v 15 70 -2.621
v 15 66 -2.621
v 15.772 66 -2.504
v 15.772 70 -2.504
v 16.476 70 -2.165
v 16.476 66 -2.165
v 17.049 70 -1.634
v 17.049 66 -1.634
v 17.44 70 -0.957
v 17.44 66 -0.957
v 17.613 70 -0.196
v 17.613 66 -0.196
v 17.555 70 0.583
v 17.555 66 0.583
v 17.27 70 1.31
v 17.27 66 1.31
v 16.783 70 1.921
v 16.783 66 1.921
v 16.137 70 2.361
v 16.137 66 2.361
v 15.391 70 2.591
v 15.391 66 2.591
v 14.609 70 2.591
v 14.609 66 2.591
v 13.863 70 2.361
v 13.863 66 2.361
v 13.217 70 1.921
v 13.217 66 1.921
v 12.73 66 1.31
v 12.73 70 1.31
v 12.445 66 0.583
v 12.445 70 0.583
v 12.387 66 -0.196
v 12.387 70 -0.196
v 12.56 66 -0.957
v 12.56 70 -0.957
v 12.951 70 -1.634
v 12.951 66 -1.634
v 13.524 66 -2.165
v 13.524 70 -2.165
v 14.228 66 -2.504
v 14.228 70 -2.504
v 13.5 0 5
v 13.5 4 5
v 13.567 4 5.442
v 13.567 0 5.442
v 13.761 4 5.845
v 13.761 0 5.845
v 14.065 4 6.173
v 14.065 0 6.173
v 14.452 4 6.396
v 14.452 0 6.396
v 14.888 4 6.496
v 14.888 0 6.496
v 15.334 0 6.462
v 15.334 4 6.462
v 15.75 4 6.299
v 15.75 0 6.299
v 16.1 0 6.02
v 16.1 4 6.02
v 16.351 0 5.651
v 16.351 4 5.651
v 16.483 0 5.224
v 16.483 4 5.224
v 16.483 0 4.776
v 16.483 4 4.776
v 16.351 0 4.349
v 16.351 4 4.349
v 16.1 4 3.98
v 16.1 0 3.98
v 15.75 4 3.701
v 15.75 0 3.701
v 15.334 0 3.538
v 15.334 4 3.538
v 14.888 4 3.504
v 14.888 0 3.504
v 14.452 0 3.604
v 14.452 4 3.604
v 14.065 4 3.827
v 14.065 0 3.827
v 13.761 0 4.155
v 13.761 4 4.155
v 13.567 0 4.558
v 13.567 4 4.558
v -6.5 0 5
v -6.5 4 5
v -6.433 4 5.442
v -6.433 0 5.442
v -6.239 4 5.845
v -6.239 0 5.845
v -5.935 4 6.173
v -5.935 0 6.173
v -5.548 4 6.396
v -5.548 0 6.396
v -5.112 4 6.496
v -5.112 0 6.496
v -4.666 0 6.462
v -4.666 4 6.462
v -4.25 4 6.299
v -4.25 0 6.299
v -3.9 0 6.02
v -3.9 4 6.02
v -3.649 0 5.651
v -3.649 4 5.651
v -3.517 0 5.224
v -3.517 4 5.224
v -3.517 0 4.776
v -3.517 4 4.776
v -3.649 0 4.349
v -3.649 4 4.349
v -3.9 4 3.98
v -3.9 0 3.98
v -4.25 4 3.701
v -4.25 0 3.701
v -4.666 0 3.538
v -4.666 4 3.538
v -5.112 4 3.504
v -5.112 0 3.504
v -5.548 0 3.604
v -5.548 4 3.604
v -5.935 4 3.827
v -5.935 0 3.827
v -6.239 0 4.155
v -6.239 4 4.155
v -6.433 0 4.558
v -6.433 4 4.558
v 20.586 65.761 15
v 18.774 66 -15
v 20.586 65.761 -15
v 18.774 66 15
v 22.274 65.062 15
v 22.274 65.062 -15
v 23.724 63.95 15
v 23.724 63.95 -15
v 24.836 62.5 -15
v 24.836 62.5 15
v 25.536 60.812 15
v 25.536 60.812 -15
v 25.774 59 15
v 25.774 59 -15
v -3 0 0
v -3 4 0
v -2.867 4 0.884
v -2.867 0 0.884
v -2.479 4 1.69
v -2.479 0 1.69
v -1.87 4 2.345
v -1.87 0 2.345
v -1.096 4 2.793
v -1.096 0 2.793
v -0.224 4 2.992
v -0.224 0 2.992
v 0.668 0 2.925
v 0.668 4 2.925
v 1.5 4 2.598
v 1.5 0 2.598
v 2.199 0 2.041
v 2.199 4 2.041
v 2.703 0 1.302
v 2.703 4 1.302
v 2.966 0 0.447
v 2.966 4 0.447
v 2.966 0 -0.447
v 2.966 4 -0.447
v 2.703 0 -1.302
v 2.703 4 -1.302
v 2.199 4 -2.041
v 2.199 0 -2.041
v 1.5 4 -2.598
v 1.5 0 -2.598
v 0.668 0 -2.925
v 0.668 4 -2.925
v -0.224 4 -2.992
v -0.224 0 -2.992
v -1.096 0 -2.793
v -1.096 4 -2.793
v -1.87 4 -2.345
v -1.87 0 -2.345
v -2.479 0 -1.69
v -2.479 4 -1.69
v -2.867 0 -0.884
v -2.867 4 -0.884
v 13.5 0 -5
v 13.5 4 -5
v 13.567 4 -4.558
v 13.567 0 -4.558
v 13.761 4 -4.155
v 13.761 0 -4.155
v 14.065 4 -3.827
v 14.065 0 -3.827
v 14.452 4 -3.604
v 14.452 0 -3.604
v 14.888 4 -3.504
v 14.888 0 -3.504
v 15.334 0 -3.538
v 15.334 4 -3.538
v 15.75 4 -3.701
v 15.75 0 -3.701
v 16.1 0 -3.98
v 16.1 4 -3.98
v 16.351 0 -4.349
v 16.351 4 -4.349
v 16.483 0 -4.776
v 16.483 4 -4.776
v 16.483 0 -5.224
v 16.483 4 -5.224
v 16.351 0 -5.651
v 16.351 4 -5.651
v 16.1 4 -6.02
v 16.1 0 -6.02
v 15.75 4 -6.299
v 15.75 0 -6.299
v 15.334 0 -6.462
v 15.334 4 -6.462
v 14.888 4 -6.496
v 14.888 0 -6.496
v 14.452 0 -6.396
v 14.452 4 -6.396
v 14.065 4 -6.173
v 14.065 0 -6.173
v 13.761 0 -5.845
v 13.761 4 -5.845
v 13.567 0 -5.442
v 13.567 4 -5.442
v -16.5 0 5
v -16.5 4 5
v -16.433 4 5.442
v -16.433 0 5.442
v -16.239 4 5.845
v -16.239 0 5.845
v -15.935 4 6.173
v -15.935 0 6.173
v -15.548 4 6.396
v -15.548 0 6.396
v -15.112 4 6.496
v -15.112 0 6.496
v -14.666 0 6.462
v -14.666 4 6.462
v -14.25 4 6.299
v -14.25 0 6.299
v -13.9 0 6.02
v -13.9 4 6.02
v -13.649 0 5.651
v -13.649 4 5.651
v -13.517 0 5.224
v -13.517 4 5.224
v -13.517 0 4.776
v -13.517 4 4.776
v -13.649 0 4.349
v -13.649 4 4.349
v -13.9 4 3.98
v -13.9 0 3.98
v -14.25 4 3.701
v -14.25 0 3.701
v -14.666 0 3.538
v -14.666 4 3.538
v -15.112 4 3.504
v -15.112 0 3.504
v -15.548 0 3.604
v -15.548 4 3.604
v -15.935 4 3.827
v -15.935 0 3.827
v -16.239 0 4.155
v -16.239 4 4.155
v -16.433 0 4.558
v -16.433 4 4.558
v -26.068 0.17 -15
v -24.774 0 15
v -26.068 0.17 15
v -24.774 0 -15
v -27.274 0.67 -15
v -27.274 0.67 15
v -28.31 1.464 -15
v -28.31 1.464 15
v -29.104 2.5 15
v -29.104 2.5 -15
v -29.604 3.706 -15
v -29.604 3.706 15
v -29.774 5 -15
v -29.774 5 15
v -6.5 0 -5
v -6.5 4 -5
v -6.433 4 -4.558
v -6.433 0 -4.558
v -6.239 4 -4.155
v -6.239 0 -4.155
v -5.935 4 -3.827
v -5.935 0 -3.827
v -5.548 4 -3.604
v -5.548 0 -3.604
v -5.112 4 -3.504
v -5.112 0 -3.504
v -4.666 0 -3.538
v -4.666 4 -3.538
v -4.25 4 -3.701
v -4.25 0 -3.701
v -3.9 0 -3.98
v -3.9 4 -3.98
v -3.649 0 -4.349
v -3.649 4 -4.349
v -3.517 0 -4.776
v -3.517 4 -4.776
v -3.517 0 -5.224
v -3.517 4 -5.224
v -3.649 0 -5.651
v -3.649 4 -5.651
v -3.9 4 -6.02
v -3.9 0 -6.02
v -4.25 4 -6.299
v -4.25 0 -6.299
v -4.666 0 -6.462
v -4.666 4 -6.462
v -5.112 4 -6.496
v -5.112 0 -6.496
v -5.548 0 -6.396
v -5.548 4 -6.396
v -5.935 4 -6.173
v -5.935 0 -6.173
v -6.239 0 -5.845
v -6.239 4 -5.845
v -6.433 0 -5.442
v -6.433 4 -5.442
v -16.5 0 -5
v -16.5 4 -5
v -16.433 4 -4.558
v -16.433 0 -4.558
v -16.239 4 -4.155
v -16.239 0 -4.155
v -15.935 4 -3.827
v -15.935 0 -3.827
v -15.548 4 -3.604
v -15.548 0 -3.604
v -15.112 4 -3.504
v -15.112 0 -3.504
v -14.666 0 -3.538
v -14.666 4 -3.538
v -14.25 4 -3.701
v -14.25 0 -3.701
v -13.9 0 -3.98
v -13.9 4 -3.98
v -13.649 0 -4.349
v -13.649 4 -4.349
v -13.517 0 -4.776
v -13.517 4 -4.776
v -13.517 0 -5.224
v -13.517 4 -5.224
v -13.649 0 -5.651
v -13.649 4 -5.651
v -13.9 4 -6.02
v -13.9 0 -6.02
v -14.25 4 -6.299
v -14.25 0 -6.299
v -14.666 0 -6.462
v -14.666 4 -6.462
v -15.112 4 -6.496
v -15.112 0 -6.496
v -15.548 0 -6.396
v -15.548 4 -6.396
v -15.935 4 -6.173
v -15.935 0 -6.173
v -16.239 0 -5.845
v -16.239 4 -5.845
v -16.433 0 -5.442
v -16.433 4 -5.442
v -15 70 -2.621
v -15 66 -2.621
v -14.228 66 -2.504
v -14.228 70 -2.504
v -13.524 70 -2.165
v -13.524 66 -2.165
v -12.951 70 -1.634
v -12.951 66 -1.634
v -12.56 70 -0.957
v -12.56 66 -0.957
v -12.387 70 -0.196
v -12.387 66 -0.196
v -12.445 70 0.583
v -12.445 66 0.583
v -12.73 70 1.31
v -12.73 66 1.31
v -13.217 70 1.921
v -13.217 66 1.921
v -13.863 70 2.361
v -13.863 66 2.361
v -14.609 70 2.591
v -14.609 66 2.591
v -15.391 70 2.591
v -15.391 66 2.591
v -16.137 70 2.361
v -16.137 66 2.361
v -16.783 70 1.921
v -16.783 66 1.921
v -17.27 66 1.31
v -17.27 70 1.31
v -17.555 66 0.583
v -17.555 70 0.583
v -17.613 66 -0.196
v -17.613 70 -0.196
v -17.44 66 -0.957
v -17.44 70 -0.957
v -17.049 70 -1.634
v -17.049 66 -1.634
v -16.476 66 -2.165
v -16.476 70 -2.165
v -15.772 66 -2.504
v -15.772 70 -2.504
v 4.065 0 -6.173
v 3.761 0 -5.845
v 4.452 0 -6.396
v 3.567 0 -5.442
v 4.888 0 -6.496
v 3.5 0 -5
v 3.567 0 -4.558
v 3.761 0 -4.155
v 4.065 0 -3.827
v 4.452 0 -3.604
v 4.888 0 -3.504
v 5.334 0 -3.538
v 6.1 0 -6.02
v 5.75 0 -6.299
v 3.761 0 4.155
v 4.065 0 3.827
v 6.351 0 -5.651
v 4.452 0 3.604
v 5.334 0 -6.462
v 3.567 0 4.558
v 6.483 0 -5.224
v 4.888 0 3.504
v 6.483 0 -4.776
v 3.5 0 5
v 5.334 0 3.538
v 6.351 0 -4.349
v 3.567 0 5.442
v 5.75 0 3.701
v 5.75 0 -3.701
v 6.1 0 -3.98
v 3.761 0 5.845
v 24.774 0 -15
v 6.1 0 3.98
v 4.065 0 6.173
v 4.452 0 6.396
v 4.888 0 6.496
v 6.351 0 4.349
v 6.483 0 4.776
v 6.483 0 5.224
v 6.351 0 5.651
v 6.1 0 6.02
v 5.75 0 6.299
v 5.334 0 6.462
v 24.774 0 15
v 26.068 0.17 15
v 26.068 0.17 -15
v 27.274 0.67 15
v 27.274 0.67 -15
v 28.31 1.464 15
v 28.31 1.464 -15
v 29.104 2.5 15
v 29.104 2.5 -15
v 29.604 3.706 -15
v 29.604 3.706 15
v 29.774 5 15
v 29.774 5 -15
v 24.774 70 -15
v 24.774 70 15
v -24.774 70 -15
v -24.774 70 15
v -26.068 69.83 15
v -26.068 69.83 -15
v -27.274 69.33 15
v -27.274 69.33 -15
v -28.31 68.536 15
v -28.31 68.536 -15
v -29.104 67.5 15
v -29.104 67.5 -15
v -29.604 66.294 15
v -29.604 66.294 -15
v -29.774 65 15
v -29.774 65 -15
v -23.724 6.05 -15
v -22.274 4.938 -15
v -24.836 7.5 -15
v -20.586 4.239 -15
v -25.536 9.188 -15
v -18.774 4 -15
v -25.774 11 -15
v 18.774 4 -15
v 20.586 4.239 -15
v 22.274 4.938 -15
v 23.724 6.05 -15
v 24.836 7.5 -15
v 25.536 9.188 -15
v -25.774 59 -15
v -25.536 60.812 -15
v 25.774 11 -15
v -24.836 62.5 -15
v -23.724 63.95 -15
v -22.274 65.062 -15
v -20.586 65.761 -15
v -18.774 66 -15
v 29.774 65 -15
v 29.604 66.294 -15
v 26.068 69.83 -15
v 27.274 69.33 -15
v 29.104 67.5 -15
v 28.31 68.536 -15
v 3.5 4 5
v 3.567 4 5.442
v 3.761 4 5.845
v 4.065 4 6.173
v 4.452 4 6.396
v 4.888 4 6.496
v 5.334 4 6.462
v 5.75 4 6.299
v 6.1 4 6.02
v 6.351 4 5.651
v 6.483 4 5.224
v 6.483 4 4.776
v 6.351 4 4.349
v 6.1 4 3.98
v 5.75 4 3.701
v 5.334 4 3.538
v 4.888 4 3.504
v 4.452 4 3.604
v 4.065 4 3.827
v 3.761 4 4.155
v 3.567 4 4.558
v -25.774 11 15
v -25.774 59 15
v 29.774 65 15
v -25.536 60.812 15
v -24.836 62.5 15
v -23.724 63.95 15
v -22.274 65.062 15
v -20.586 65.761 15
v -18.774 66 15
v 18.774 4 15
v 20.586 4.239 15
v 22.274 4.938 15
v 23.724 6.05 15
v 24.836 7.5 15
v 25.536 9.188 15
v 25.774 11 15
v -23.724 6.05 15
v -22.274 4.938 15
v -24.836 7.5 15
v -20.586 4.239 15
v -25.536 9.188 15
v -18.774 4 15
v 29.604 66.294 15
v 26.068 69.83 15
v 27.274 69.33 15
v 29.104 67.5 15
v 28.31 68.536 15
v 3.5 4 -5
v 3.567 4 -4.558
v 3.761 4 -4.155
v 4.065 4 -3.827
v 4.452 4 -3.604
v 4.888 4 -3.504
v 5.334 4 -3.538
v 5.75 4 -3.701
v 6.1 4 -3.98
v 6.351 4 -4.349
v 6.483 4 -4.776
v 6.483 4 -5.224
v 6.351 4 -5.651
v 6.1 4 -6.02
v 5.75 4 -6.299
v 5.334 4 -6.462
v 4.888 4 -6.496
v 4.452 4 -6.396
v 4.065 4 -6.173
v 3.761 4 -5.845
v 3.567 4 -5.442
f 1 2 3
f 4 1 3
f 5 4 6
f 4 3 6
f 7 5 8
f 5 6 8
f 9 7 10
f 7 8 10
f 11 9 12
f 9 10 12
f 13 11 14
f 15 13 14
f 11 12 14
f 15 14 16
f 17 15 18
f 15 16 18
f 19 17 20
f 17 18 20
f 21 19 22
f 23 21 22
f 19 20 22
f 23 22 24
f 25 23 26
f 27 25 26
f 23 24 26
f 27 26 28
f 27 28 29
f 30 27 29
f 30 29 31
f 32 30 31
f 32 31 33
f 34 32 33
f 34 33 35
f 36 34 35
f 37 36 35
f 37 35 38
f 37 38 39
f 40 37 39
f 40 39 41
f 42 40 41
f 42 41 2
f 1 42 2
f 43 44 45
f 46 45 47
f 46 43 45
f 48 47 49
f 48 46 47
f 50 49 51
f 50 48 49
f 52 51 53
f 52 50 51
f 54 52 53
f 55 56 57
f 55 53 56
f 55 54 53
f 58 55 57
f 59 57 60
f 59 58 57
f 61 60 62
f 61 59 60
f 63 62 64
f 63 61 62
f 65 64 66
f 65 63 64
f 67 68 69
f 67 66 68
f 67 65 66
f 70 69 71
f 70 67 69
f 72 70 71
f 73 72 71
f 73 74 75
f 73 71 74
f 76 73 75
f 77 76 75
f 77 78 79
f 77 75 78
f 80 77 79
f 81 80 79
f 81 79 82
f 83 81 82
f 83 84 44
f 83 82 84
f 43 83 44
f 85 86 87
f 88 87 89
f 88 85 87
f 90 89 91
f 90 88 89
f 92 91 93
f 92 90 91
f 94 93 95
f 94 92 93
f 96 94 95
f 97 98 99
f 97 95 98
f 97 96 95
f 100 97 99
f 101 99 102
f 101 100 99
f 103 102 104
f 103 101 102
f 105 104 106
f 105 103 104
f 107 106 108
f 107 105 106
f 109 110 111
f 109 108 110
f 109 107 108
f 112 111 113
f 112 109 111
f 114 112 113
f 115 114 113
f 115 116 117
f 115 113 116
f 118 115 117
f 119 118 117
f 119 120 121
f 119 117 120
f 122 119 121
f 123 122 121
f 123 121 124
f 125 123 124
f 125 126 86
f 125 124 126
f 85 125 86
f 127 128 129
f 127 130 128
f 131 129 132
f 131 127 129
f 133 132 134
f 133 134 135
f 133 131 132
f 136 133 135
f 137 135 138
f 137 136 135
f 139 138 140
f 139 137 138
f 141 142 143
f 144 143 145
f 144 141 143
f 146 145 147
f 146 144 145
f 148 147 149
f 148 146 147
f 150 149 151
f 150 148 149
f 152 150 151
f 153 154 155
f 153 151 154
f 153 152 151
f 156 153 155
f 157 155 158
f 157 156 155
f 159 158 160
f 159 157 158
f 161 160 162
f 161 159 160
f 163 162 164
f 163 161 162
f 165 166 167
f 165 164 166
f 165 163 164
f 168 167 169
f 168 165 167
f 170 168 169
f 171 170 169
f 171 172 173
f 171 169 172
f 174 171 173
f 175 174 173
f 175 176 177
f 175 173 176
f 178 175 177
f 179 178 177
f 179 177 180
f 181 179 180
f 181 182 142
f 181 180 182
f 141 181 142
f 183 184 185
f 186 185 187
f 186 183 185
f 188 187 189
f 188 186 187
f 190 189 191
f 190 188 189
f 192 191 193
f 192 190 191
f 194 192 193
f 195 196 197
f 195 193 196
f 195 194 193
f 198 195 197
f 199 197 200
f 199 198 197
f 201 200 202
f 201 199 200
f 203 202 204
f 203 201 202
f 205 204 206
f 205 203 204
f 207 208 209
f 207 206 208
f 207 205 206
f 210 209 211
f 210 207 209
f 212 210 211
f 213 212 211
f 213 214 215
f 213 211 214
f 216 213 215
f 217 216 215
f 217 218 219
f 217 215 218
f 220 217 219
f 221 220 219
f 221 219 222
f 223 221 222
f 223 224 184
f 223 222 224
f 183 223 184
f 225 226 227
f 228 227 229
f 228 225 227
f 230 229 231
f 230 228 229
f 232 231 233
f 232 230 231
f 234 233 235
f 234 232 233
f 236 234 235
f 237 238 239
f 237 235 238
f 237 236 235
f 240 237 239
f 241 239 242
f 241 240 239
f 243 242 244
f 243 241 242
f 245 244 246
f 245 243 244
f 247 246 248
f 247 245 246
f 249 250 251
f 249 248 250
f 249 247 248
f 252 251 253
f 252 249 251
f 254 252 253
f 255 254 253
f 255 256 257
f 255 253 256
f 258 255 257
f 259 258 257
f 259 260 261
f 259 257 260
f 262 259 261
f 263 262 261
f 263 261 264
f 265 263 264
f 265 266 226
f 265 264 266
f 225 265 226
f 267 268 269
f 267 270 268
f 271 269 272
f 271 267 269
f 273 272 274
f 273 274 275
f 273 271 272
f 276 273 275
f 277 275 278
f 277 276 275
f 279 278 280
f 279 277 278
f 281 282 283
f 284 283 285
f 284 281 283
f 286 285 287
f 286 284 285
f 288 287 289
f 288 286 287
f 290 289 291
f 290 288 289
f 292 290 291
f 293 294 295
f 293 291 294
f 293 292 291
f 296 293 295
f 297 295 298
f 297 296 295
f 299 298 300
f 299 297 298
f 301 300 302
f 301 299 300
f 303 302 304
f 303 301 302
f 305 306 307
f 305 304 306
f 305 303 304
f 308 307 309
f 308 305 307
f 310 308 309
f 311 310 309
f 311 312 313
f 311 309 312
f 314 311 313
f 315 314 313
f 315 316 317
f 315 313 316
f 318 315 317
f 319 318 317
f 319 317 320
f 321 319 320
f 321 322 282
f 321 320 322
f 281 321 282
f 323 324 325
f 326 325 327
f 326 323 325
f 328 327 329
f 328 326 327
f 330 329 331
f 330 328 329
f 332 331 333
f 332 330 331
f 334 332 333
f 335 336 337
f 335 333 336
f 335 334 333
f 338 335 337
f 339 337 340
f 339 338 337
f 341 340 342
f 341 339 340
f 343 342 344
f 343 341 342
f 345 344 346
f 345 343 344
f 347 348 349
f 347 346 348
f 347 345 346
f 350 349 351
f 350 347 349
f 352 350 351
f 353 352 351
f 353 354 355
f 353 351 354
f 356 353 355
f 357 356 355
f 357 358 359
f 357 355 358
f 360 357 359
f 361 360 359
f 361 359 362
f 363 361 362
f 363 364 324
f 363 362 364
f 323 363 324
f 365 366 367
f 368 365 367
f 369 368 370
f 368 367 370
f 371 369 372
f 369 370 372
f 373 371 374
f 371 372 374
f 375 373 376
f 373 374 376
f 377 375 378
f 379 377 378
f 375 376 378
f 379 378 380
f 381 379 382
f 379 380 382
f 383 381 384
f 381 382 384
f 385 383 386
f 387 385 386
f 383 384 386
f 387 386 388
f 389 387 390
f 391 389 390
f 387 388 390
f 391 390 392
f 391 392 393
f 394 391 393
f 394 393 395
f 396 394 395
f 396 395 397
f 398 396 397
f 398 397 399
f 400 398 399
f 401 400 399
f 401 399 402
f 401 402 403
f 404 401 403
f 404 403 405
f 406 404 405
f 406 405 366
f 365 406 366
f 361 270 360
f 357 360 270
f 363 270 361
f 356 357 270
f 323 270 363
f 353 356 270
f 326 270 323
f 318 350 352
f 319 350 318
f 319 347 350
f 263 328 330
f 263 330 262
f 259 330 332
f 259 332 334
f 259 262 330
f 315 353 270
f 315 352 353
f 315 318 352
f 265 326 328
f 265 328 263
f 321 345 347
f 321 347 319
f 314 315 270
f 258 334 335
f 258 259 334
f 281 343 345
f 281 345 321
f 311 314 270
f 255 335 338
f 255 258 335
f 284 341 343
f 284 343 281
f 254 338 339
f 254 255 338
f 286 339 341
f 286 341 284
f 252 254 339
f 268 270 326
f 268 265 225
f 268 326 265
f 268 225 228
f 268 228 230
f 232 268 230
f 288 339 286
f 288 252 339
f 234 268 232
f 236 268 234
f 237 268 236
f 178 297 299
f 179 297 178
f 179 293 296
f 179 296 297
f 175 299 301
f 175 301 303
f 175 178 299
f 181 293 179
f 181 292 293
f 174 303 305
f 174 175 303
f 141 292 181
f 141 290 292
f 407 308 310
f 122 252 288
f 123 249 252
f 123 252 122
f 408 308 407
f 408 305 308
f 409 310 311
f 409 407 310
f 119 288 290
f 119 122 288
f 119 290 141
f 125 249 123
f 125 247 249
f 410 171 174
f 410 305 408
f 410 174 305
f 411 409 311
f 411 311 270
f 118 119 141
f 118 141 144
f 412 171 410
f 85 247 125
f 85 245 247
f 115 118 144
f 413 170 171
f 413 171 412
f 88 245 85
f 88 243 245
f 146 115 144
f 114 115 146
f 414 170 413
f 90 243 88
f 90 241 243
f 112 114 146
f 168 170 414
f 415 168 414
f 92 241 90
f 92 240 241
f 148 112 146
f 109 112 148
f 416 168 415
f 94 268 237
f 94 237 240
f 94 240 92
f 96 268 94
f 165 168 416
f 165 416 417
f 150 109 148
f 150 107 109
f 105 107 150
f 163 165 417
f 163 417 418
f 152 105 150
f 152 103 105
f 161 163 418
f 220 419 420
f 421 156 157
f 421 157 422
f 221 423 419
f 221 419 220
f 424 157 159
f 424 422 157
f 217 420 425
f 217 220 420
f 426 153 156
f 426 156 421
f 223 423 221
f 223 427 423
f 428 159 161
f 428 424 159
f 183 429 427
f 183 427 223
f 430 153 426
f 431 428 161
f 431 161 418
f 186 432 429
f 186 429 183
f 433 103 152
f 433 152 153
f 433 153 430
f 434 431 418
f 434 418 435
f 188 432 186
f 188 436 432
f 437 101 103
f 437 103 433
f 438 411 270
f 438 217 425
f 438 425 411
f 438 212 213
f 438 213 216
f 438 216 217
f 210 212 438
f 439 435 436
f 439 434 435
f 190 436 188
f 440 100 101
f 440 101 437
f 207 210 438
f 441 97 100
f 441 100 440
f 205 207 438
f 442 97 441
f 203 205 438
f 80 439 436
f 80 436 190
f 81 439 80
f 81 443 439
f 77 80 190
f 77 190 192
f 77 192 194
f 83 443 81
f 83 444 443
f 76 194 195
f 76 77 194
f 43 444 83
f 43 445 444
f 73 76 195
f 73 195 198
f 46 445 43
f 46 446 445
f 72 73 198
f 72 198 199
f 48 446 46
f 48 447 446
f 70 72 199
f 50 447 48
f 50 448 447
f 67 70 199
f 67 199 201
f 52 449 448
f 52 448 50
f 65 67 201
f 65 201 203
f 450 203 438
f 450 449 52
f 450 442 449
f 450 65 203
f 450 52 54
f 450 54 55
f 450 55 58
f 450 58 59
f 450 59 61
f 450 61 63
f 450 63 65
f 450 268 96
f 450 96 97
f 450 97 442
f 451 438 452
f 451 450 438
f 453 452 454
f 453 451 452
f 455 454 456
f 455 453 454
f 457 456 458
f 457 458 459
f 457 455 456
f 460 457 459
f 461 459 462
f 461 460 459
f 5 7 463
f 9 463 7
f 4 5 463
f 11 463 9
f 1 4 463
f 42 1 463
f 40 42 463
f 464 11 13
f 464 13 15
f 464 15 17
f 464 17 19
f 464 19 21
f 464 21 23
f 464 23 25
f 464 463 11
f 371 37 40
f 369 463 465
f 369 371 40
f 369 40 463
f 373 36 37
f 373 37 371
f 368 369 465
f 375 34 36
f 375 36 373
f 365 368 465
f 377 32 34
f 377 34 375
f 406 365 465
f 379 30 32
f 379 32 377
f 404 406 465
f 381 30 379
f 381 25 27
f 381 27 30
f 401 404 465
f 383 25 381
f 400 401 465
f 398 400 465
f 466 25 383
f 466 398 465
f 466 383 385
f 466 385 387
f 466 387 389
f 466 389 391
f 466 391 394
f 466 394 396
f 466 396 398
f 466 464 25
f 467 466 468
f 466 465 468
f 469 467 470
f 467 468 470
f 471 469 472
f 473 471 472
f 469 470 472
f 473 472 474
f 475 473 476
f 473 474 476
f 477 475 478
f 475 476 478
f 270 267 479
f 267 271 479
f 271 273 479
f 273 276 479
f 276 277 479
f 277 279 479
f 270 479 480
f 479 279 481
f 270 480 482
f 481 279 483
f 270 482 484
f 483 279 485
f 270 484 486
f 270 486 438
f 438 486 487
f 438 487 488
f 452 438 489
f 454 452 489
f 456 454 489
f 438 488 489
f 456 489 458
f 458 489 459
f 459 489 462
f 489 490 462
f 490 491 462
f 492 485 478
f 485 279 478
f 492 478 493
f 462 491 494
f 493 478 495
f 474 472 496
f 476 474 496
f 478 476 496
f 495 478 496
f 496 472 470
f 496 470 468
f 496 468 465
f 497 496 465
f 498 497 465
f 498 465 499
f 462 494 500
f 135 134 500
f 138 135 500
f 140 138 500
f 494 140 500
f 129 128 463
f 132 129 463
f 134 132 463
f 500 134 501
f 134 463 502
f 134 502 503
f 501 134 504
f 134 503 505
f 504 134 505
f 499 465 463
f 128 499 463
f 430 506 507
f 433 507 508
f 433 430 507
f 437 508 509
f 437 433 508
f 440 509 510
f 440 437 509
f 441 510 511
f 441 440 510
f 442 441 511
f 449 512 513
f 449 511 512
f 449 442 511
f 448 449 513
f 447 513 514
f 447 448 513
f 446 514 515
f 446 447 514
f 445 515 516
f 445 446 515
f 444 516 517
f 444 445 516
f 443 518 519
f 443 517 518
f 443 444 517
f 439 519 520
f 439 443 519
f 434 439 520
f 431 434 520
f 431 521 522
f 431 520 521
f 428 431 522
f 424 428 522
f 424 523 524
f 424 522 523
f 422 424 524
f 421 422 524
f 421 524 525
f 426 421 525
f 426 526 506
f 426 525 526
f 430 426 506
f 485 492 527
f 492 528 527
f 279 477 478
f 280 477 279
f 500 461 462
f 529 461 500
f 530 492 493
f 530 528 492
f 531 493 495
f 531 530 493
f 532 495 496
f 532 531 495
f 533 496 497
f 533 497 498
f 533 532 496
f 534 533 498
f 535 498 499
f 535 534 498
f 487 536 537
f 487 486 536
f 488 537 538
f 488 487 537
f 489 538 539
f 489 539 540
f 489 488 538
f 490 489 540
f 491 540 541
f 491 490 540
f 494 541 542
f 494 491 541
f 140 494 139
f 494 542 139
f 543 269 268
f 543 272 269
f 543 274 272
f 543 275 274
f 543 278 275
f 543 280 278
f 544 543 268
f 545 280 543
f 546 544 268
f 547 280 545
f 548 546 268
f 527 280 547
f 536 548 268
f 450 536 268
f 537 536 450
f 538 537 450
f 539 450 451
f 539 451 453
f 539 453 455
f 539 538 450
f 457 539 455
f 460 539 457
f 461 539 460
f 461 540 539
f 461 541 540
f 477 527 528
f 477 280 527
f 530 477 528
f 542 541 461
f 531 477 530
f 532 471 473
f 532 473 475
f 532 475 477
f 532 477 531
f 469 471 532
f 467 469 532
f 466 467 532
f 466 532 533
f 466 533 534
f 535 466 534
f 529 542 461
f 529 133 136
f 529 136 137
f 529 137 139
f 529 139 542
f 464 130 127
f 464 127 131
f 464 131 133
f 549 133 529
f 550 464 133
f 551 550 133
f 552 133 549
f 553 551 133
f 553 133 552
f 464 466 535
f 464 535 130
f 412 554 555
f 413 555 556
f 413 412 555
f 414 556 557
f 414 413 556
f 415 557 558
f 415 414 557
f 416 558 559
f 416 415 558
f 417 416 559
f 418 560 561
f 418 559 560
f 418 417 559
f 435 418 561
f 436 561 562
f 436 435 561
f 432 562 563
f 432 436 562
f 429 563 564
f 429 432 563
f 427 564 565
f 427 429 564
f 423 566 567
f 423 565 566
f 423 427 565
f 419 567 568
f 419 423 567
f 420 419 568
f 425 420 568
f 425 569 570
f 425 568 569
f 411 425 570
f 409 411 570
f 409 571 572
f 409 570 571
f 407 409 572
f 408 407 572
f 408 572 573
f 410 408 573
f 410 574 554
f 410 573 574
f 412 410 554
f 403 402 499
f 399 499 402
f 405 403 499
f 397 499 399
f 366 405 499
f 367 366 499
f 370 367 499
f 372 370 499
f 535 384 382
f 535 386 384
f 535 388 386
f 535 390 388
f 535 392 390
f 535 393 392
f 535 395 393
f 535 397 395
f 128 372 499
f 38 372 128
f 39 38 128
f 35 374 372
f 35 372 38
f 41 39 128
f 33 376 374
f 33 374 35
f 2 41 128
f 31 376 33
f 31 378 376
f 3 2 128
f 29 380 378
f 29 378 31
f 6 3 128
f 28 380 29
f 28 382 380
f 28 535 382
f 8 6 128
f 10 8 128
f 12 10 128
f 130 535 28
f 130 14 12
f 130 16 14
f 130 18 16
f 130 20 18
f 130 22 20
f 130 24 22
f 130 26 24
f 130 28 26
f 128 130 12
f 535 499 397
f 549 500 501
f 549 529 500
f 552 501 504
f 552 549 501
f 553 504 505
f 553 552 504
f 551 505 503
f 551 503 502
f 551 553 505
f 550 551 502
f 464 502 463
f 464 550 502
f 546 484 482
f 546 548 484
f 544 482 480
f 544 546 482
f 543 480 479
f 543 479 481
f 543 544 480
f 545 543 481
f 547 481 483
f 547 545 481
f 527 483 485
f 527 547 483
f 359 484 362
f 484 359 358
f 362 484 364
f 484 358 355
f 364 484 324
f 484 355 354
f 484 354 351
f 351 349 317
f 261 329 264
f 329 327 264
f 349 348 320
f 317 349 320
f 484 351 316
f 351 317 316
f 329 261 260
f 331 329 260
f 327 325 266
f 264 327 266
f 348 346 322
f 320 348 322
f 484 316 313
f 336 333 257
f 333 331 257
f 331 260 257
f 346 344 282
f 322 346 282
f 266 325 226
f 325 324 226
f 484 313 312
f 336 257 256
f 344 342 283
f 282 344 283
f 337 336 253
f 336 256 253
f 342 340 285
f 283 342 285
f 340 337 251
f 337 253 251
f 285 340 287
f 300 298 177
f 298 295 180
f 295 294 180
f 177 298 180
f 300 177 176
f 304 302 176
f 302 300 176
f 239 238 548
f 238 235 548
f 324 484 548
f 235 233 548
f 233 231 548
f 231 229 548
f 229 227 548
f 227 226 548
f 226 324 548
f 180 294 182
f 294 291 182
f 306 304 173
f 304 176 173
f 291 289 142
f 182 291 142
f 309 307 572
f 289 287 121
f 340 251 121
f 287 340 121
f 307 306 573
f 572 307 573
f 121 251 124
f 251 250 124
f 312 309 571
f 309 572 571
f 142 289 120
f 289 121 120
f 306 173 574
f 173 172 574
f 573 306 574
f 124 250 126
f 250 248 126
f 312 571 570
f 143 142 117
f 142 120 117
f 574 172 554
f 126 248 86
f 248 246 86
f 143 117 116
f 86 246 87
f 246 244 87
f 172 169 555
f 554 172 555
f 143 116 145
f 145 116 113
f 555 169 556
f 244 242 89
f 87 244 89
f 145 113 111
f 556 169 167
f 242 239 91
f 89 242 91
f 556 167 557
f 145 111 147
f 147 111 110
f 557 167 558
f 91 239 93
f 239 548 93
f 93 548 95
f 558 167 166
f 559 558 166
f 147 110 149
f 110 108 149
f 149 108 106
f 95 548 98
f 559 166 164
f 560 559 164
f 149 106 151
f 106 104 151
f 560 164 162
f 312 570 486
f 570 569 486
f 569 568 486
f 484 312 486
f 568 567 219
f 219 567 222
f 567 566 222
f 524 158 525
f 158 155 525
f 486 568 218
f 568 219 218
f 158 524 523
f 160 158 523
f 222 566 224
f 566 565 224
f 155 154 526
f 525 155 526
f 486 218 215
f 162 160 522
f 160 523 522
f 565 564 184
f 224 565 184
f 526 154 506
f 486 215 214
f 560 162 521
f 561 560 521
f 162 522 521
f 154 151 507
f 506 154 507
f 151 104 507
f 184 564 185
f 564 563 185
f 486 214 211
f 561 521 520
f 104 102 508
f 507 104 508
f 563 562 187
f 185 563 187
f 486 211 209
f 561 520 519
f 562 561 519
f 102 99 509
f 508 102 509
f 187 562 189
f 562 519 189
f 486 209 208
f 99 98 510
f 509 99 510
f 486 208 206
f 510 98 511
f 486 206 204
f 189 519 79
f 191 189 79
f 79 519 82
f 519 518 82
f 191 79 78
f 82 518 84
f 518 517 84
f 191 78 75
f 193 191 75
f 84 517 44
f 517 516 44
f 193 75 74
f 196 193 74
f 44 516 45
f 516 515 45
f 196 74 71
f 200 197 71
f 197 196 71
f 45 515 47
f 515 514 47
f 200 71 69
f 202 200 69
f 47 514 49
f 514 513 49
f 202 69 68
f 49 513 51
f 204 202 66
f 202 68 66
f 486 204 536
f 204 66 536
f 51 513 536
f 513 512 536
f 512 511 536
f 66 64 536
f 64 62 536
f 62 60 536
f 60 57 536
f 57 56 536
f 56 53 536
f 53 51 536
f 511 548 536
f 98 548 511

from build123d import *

# Parameters (mm, degrees)
EXTRUDE_2_DEPTH     = 15
SKETCH_2_R          = 2.62067407
CUT_EXTRUDE_1_DEPTH = 74.942500428
FILLET_1_R          = 7
CUT_EXTRUDE_2_REACH = 79.534
SKETCH_3_R          = 3
SKETCH_3_R_2        = 1.5
FILLET_2_R          = 5


with BuildPart() as part:
    # 草图1 → 拉伸-薄壁2 (new, symmetric)
    with BuildSketch(Plane.XY):
        Polygon((-29.774038515, 0), (29.774038515, 0), (29.774038515, 70), (0, 70), (-29.774038515, 70), align=None)
        Polygon((-25.774038515, 4), (25.774038515, 4), (25.774038515, 66), (0, 66), (-25.774038515, 66), align=None, mode=Mode.SUBTRACT)
    extrude(amount=EXTRUDE_2_DEPTH, both=True)

    # 草图2 → 切除-拉伸1 (cut, through all)
    with BuildSketch(Plane(origin=(0, 66, 0), x_dir=(-1, 0, 0), z_dir=(0, -1, 0))):
        with Locations(Location((-15, 0, 0), (0, 0, 90))):
            Circle(SKETCH_2_R)
        with Locations(Location((15, 0, 0), (0, 0, 90))):
            Circle(SKETCH_2_R)
    extrude(amount=-CUT_EXTRUDE_1_DEPTH, mode=Mode.SUBTRACT)

    # 圆角1
    fillet_1_edges = [part.edges().sort_by_distance(p)[0] for p in [
        (-25.774038515, 4, 0),
        (25.774038515, 4, 0),
        (25.774038515, 66, 0),
        (-25.774038515, 66, 0),
    ]]
    fillet(fillet_1_edges, radius=FILLET_1_R)

    # 草图3 → 切除-拉伸2 (cut, up to next)
    with BuildSketch(Plane(origin=(0, 0, 0), x_dir=(1, 0, 0), z_dir=(0, 1, 0)), mode=Mode.PRIVATE) as cut_extrude_2_sk1:
        with Locations(Location((0, 0, 0), (0, 0, 180))):
            Circle(SKETCH_3_R)
    cut_extrude_2_tool1 = extrude(cut_extrude_2_sk1.sketch, amount=CUT_EXTRUDE_2_REACH, mode=Mode.PRIVATE) & part.part
    # 草图3 → 切除-拉伸2 (cut, up to next)
    with BuildSketch(Plane(origin=(0, 0, 0), x_dir=(1, 0, 0), z_dir=(0, 1, 0)), mode=Mode.PRIVATE) as cut_extrude_2_sk2:
        with Locations(Location((-15, 5, 0), (0, 0, 180))):
            Circle(SKETCH_3_R_2)
    cut_extrude_2_tool2 = extrude(cut_extrude_2_sk2.sketch, amount=CUT_EXTRUDE_2_REACH, mode=Mode.PRIVATE) & part.part
    # 草图3 → 切除-拉伸2 (cut, up to next)
    with BuildSketch(Plane(origin=(0, 0, 0), x_dir=(1, 0, 0), z_dir=(0, 1, 0)), mode=Mode.PRIVATE) as cut_extrude_2_sk3:
        with Locations(Location((-5, 5, 0), (0, 0, 180))):
            Circle(SKETCH_3_R_2)
    cut_extrude_2_tool3 = extrude(cut_extrude_2_sk3.sketch, amount=CUT_EXTRUDE_2_REACH, mode=Mode.PRIVATE) & part.part
    # 草图3 → 切除-拉伸2 (cut, up to next)
    with BuildSketch(Plane(origin=(0, 0, 0), x_dir=(1, 0, 0), z_dir=(0, 1, 0)), mode=Mode.PRIVATE) as cut_extrude_2_sk4:
        with Locations(Location((5, 5, 0), (0, 0, 180))):
            Circle(SKETCH_3_R_2)
    cut_extrude_2_tool4 = extrude(cut_extrude_2_sk4.sketch, amount=CUT_EXTRUDE_2_REACH, mode=Mode.PRIVATE) & part.part
    # 草图3 → 切除-拉伸2 (cut, up to next)
    with BuildSketch(Plane(origin=(0, 0, 0), x_dir=(1, 0, 0), z_dir=(0, 1, 0)), mode=Mode.PRIVATE) as cut_extrude_2_sk5:
        with Locations(Location((15, 5, 0), (0, 0, 180))):
            Circle(SKETCH_3_R_2)
    cut_extrude_2_tool5 = extrude(cut_extrude_2_sk5.sketch, amount=CUT_EXTRUDE_2_REACH, mode=Mode.PRIVATE) & part.part
    # 草图3 → 切除-拉伸2 (cut, up to next)
    with BuildSketch(Plane(origin=(0, 0, 0), x_dir=(1, 0, 0), z_dir=(0, 1, 0)), mode=Mode.PRIVATE) as cut_extrude_2_sk6:
        with Locations(Location((-5, -5, 0), (0, 0, 180))):
            Circle(SKETCH_3_R_2)
    cut_extrude_2_tool6 = extrude(cut_extrude_2_sk6.sketch, amount=CUT_EXTRUDE_2_REACH, mode=Mode.PRIVATE) & part.part
    # 草图3 → 切除-拉伸2 (cut, up to next)
    with BuildSketch(Plane(origin=(0, 0, 0), x_dir=(1, 0, 0), z_dir=(0, 1, 0)), mode=Mode.PRIVATE) as cut_extrude_2_sk7:
        with Locations(Location((5, -5, 0), (0, 0, 180))):
            Circle(SKETCH_3_R_2)
    cut_extrude_2_tool7 = extrude(cut_extrude_2_sk7.sketch, amount=CUT_EXTRUDE_2_REACH, mode=Mode.PRIVATE) & part.part
    # 草图3 → 切除-拉伸2 (cut, up to next)
    with BuildSketch(Plane(origin=(0, 0, 0), x_dir=(1, 0, 0), z_dir=(0, 1, 0)), mode=Mode.PRIVATE) as cut_extrude_2_sk8:
        with Locations(Location((15, -5, 0), (0, 0, 180))):
            Circle(SKETCH_3_R_2)
    cut_extrude_2_tool8 = extrude(cut_extrude_2_sk8.sketch, amount=CUT_EXTRUDE_2_REACH, mode=Mode.PRIVATE) & part.part
    # 草图3 → 切除-拉伸2 (cut, up to next)
    with BuildSketch(Plane(origin=(0, 0, 0), x_dir=(1, 0, 0), z_dir=(0, 1, 0)), mode=Mode.PRIVATE) as cut_extrude_2_sk9:
        with Locations(Location((-15, -5, 0), (0, 0, 180))):
            Circle(SKETCH_3_R_2)
    cut_extrude_2_tool9 = extrude(cut_extrude_2_sk9.sketch, amount=CUT_EXTRUDE_2_REACH, mode=Mode.PRIVATE) & part.part
    add(cut_extrude_2_tool1.solids().sort_by_distance((0, 0, 0))[0], mode=Mode.SUBTRACT)
    add(cut_extrude_2_tool2.solids().sort_by_distance((-15, 0, -5))[0], mode=Mode.SUBTRACT)
    add(cut_extrude_2_tool3.solids().sort_by_distance((-5, 0, -5))[0], mode=Mode.SUBTRACT)
    add(cut_extrude_2_tool4.solids().sort_by_distance((5, 0, -5))[0], mode=Mode.SUBTRACT)
    add(cut_extrude_2_tool5.solids().sort_by_distance((15, 0, -5))[0], mode=Mode.SUBTRACT)
    add(cut_extrude_2_tool6.solids().sort_by_distance((-5, 0, 5))[0], mode=Mode.SUBTRACT)
    add(cut_extrude_2_tool7.solids().sort_by_distance((5, 0, 5))[0], mode=Mode.SUBTRACT)
    add(cut_extrude_2_tool8.solids().sort_by_distance((15, 0, 5))[0], mode=Mode.SUBTRACT)
    add(cut_extrude_2_tool9.solids().sort_by_distance((-15, 0, 5))[0], mode=Mode.SUBTRACT)

    # 圆角2
    fillet_2_edges = [part.edges().sort_by_distance(p)[0] for p in [
        (-29.774038515, 0, 0),
        (-29.774038515, 70, 0),
        (29.774038515, 70, 0),
        (29.774038515, 0, 0),
    ]]
    fillet(fillet_2_edges, radius=FILLET_2_R)


solid = part.part
